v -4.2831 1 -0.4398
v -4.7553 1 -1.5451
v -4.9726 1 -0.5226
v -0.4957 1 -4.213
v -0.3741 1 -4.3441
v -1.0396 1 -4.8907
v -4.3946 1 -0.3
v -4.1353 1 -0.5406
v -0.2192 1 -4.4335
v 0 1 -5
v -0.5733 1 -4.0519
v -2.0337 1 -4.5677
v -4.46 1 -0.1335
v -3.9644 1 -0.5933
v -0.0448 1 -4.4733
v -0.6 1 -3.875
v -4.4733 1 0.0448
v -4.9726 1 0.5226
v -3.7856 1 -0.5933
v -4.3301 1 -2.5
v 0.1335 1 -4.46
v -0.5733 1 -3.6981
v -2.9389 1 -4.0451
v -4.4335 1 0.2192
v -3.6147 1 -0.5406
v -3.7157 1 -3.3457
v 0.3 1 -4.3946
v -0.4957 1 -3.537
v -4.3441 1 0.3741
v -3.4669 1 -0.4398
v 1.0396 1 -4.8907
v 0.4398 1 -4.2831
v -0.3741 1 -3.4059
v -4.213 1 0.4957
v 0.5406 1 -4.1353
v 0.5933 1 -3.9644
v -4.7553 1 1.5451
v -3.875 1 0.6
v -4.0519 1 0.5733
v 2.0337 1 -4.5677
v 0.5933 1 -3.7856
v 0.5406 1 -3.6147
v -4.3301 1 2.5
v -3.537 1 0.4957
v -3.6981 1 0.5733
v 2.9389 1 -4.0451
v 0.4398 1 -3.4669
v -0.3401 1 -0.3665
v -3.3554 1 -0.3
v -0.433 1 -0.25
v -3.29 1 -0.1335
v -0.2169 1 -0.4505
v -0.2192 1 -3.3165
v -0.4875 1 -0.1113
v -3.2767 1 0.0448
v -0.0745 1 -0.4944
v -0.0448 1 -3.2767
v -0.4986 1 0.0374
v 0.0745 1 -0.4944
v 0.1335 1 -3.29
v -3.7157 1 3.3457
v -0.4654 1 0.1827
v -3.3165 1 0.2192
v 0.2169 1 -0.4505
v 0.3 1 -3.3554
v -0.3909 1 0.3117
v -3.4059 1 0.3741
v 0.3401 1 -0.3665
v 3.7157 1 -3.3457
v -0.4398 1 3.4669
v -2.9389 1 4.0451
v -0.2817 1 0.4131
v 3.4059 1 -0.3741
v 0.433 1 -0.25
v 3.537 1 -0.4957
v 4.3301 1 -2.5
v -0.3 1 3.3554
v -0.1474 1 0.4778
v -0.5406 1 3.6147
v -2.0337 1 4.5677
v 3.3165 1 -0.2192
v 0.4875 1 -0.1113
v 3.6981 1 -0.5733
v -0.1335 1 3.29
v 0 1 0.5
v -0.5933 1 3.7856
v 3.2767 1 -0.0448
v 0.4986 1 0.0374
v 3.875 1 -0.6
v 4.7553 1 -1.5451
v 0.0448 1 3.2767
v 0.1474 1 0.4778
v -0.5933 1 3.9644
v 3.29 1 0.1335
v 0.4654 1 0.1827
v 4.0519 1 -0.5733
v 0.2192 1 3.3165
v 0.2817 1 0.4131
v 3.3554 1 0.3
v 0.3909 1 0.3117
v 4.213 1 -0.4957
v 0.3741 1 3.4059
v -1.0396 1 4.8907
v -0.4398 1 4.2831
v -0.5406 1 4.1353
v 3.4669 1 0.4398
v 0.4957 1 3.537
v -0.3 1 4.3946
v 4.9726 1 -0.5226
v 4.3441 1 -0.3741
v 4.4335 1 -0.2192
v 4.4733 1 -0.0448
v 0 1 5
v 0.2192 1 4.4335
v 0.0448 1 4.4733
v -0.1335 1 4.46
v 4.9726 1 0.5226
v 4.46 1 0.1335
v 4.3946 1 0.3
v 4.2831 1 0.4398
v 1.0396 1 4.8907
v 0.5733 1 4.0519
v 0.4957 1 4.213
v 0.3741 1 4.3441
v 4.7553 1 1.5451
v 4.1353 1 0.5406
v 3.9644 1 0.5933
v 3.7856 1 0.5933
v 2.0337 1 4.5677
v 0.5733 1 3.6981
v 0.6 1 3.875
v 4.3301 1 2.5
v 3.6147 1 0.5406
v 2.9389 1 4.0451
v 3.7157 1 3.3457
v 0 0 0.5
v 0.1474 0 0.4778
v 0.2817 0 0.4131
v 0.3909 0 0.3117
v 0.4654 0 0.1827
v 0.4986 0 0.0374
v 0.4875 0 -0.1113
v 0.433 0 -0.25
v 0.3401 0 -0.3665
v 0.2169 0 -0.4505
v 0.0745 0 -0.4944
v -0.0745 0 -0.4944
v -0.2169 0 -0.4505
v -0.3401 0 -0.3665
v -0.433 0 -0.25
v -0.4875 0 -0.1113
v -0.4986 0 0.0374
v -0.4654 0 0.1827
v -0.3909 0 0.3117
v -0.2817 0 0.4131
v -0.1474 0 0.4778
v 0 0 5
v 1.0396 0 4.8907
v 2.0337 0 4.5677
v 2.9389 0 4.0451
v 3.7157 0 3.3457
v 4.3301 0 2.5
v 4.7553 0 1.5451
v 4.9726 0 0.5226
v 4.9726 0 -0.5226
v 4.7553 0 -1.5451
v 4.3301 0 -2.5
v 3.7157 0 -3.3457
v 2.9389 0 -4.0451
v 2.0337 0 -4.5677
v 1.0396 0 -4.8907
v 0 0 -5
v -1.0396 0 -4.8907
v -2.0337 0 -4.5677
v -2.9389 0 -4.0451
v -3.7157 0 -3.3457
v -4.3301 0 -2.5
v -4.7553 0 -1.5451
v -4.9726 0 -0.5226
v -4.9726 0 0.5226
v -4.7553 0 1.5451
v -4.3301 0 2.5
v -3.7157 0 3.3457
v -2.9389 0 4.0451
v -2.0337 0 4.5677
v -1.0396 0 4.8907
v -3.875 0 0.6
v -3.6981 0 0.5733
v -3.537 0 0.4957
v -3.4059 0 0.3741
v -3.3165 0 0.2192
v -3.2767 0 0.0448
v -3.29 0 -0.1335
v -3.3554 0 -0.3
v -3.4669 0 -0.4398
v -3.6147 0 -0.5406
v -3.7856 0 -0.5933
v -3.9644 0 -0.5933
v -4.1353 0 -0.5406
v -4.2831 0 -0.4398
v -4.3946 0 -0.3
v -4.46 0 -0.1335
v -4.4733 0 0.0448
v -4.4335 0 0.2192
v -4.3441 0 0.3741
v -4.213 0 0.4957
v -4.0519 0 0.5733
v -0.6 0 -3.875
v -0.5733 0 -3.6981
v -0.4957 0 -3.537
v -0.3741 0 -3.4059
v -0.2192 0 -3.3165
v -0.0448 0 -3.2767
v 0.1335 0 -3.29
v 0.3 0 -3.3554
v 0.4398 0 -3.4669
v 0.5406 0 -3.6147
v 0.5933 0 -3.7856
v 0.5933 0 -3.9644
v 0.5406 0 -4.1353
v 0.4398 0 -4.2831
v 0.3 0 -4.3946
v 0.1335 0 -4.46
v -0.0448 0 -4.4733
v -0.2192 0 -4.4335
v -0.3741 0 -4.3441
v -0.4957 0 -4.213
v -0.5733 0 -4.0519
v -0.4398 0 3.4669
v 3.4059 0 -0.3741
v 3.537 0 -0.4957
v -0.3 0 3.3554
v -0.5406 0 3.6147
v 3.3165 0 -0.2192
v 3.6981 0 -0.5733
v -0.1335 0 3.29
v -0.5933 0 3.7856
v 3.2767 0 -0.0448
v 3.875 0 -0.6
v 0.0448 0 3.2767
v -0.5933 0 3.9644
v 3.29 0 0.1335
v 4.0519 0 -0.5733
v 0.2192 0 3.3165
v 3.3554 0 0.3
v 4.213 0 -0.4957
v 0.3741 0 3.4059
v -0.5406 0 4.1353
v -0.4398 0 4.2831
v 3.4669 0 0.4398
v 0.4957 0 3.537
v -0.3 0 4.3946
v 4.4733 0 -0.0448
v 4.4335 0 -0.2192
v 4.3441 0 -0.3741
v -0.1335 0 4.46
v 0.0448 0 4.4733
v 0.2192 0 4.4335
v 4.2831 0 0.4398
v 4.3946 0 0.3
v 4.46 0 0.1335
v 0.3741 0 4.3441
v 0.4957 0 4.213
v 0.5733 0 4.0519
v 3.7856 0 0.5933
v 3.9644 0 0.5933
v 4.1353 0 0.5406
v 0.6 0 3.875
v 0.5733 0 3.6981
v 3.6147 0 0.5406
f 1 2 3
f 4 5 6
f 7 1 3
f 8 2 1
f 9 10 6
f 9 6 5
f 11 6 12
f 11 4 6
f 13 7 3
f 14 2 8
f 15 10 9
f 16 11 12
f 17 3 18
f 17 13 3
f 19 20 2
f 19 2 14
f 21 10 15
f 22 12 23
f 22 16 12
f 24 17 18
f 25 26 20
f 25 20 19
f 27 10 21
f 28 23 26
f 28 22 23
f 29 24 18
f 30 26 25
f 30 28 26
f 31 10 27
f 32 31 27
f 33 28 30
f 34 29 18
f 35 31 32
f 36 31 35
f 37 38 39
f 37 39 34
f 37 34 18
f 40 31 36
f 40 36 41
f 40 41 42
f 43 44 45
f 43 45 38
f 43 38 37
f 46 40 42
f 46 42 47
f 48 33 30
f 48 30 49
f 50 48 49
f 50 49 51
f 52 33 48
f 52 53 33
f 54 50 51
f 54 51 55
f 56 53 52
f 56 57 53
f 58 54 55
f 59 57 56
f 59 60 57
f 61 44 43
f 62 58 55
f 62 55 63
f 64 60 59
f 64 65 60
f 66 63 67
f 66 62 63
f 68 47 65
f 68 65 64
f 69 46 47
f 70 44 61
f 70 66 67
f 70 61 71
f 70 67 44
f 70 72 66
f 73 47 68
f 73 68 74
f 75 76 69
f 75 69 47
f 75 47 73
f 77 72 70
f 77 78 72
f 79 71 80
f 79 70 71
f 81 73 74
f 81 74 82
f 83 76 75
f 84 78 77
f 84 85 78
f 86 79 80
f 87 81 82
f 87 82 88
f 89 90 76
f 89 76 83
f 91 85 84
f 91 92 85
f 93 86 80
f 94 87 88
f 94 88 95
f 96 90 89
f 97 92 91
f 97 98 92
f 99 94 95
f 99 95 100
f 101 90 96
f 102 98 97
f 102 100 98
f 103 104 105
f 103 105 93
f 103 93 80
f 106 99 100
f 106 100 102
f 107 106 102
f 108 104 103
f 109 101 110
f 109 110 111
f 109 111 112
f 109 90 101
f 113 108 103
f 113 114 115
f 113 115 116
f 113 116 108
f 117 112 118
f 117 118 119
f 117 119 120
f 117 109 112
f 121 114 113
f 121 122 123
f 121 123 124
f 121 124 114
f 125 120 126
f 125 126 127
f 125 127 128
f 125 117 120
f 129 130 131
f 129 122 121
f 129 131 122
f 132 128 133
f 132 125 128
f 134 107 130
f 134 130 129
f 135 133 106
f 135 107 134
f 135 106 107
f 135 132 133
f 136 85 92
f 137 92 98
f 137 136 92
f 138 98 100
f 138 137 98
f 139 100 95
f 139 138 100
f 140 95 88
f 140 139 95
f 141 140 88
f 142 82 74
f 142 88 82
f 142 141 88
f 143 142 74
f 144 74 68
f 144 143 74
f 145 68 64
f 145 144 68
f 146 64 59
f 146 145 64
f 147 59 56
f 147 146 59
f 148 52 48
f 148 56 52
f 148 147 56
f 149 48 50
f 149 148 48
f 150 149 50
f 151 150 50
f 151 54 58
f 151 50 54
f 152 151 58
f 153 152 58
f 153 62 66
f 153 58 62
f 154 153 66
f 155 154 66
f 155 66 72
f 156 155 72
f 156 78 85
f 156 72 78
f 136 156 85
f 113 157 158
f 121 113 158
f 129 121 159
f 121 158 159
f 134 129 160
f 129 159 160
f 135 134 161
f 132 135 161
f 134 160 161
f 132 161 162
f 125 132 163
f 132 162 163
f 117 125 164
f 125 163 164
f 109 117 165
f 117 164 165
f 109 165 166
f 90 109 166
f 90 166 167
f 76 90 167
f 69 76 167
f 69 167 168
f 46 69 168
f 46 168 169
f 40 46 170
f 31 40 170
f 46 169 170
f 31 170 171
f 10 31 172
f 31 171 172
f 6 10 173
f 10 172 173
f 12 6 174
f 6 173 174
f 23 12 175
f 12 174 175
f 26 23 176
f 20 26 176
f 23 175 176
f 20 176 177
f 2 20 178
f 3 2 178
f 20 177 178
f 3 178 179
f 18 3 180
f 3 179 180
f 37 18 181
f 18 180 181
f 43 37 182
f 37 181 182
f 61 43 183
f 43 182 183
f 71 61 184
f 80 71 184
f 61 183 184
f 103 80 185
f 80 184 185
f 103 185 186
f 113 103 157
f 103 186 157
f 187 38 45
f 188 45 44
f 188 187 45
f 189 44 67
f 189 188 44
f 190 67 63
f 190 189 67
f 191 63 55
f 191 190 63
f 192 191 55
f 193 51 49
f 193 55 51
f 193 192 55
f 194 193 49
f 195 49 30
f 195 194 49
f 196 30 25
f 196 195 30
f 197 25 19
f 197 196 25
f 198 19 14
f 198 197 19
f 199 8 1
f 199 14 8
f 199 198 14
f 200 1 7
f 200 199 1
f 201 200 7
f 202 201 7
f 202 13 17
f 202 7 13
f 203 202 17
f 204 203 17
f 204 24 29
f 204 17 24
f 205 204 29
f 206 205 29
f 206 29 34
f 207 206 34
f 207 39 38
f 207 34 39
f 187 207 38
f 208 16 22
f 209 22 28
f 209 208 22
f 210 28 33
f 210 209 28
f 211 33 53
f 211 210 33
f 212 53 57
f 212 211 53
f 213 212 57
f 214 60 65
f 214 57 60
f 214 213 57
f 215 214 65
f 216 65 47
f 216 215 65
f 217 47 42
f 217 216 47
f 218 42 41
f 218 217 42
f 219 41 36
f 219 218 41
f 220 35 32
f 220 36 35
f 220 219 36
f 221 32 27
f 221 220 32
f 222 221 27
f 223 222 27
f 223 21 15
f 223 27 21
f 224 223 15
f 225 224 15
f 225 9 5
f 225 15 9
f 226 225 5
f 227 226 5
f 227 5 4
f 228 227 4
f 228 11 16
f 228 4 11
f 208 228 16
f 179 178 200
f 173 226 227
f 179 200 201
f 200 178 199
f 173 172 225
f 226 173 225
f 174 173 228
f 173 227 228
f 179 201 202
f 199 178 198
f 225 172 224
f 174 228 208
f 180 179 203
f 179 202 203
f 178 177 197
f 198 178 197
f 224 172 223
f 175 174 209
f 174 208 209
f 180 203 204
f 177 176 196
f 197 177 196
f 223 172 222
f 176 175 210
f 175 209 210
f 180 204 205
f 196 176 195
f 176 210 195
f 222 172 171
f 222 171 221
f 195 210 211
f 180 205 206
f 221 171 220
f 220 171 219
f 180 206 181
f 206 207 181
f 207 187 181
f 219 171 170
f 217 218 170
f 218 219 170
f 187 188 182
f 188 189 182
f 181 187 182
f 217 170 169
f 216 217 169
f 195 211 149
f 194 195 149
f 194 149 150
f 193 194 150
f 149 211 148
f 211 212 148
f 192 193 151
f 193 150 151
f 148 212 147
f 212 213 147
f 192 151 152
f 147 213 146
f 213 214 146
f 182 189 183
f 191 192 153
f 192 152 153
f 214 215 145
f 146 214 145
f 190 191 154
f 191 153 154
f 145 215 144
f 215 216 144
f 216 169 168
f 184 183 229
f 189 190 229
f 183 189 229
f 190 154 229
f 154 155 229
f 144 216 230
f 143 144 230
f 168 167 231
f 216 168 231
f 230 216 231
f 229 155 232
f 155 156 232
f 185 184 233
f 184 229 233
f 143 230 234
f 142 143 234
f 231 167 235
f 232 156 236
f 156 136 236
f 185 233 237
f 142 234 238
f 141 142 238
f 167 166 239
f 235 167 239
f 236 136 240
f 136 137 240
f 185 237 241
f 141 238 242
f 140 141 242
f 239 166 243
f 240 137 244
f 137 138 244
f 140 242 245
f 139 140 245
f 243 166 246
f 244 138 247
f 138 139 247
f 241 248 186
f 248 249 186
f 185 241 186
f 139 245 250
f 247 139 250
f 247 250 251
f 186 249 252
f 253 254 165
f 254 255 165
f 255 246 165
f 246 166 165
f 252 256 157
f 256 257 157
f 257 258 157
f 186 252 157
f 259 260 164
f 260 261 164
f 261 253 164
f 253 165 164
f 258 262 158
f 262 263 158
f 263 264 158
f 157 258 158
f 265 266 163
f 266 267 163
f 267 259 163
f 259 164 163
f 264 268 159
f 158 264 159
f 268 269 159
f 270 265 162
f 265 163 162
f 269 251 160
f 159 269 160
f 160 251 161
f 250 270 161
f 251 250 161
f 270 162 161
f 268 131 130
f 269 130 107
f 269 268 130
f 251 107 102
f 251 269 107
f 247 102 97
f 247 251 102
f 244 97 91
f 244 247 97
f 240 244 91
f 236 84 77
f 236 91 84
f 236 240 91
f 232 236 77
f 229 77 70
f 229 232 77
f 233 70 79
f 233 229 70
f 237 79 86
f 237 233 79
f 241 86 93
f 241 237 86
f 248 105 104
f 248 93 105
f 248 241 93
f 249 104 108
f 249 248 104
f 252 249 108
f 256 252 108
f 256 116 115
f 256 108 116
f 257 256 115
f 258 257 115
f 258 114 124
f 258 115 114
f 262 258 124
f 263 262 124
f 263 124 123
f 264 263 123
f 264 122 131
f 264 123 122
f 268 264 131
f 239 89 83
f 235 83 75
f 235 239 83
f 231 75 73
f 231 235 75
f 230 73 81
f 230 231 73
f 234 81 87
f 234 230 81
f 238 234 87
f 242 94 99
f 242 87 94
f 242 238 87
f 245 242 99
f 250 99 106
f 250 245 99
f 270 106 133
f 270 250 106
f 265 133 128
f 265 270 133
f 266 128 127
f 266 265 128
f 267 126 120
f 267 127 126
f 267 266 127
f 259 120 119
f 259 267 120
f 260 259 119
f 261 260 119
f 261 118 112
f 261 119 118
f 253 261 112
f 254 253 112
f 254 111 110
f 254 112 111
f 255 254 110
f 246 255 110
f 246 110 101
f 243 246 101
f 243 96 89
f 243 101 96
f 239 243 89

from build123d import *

# Parameters (mm, degrees)
SKETCH_1_R               = 5
EXTRUDE_1_DEPTH          = 1
SKETCH_1_6_R             = 0.5
CUT_EXTRUDE_2_DEPTH      = 8.141428429
SKETCH_1_7_R             = 0.6
CUT_EXTRUDE_3_DEPTH      = 2
PATTERN_CIRCULAR_1_COUNT = 4


with BuildPart() as part:
    # 草图1 → 凸台-拉伸1 (new body)
    with BuildSketch(Plane(origin=(0, 0, 0), x_dir=(1, 0, 0), z_dir=(0, 1, 0))):
        Circle(SKETCH_1_R)
    extrude(amount=EXTRUDE_1_DEPTH)

    # 草图1<6> → 切除-拉伸2 (cut, through all)
    with BuildSketch(Plane(origin=(0, 0, 0), x_dir=(1, 0, 0), z_dir=(0, 1, 0))):
        Circle(SKETCH_1_6_R)
    extrude(amount=CUT_EXTRUDE_2_DEPTH, mode=Mode.SUBTRACT)

    # 草图1<7> → 切除-拉伸3 (cut)
    with BuildSketch(Plane(origin=(0, 0, 0), x_dir=(1, 0, 0), z_dir=(0, 1, 0))):
        with Locations((-3.875, 0)):
            Circle(SKETCH_1_7_R)
    cut_extrude_3 = extrude(amount=CUT_EXTRUDE_3_DEPTH, mode=Mode.SUBTRACT)

    # 阵列(圆周)1: 切除-拉伸3 ×4 about axis
    pattern_circular_1_axis = Axis((0, 1, 0), (0, -1, 0))
    for i in range(1, PATTERN_CIRCULAR_1_COUNT):
        add(cut_extrude_3.rotate(pattern_circular_1_axis, i * 360 / PATTERN_CIRCULAR_1_COUNT), mode=Mode.SUBTRACT)


solid = part.part
